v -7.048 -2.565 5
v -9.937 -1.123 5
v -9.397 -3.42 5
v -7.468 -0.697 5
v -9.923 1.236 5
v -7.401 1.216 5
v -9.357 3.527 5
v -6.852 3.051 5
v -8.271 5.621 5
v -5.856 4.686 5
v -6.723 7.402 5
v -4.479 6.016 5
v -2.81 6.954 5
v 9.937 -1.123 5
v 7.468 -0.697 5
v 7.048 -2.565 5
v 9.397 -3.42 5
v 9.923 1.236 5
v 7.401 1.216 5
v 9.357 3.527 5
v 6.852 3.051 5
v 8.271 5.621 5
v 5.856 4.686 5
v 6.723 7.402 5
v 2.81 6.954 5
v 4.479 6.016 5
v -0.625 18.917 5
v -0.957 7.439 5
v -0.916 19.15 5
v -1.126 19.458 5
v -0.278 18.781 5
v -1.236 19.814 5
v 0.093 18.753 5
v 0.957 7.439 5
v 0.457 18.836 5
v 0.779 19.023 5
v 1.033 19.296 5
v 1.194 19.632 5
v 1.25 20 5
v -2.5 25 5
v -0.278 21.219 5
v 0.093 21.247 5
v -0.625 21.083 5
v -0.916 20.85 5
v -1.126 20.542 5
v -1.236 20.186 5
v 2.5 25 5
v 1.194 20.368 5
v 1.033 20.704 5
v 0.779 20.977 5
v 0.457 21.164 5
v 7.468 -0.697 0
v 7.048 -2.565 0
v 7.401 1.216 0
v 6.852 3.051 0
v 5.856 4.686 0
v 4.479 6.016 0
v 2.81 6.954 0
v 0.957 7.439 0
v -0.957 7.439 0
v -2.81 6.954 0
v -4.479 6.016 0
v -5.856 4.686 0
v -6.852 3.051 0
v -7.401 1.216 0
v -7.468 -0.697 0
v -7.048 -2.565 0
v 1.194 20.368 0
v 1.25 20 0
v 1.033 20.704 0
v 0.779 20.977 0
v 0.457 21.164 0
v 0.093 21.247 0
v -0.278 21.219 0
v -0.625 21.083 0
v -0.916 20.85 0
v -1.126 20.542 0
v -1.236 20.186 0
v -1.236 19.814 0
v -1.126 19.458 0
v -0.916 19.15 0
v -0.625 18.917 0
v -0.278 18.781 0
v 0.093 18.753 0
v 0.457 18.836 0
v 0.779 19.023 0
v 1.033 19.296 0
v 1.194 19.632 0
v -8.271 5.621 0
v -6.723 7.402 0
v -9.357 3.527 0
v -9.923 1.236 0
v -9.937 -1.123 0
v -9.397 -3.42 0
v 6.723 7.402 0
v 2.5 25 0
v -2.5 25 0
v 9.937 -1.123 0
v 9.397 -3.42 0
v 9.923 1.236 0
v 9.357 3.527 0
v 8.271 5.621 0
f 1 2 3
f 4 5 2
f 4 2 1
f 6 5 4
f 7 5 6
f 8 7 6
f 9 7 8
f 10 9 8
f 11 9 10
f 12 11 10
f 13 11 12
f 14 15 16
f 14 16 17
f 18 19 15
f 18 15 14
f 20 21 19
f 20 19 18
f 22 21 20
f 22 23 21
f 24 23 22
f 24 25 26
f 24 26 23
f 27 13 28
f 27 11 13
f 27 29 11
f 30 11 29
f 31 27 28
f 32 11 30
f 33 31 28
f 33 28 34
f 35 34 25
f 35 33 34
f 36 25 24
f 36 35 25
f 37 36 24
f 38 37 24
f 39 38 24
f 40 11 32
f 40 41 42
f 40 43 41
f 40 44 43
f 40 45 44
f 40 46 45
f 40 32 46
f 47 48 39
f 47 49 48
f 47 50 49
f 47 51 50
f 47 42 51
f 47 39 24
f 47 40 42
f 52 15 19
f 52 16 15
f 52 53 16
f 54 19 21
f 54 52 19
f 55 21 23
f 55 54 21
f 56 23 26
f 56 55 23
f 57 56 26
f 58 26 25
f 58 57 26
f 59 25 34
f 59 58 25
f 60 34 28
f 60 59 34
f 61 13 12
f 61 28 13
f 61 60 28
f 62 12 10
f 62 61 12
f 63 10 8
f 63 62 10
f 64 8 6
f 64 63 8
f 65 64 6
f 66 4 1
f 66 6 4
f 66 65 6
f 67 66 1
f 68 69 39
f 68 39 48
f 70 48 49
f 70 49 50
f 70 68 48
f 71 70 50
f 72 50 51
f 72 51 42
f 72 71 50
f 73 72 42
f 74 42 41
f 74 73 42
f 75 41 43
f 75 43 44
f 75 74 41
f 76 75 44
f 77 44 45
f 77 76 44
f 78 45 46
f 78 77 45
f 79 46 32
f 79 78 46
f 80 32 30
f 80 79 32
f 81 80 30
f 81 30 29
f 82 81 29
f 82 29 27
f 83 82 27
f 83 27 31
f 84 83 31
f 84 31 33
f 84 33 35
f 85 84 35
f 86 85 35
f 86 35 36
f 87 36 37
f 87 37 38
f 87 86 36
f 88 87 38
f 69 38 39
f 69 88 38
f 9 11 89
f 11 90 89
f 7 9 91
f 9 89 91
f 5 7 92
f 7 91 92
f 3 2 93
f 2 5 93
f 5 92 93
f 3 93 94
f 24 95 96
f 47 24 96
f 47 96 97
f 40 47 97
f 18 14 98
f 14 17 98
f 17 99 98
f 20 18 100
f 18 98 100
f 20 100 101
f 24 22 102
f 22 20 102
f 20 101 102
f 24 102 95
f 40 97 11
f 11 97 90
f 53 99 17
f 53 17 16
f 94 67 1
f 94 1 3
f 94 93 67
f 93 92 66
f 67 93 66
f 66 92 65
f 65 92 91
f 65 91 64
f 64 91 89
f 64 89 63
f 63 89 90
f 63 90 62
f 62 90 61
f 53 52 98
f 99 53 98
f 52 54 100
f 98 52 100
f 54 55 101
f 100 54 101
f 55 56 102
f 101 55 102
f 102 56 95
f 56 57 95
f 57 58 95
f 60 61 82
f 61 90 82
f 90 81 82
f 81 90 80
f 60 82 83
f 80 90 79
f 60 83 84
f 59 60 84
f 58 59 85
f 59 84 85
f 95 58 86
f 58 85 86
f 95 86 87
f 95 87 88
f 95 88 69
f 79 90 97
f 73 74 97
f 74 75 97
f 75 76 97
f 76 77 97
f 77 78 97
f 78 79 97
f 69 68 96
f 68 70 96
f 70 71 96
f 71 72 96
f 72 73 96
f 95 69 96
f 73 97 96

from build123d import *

# Parameters (mm, degrees)
F0_R     = 10
F1_DEPTH = 5
F3_DEPTH = 5
F4_R     = 7.5
F5_DEPTH = 5
F7_DEPTH = 5
F8_R     = 1.25
F9_DEPTH = 5


with BuildPart() as f1:
    # F0 (on Top) → F1 (new body)
    with BuildSketch(Plane.XY):
        Circle(F0_R)
    extrude(amount=F1_DEPTH)

    # F2 (on Top) → F3 (join)
    with BuildSketch(Plane.XY):
        Polygon((-2.5, 25), (-8.5, 0), (8.5, 0), (2.5, 25), align=None)
    extrude(amount=F3_DEPTH)

    # F4 (on Top) → F5 (cut)
    with BuildSketch(Plane.XY):
        Circle(F4_R)
    extrude(amount=F5_DEPTH, mode=Mode.SUBTRACT)

    # F6 (on Top) → F7 (cut)
    with BuildSketch(Plane.XY):
        Polygon((19.809051, -7.209905), (0, 0), (-19.809051, -7.209905), (0, -14.41981), align=None)
    extrude(amount=F7_DEPTH, mode=Mode.SUBTRACT)

    # F8 (on Top) → F9 (cut)
    with BuildSketch(Plane.XY):
        with Locations((0, 20)):
            Circle(F8_R)
    extrude(amount=F9_DEPTH, mode=Mode.SUBTRACT)


solid = f1.part
